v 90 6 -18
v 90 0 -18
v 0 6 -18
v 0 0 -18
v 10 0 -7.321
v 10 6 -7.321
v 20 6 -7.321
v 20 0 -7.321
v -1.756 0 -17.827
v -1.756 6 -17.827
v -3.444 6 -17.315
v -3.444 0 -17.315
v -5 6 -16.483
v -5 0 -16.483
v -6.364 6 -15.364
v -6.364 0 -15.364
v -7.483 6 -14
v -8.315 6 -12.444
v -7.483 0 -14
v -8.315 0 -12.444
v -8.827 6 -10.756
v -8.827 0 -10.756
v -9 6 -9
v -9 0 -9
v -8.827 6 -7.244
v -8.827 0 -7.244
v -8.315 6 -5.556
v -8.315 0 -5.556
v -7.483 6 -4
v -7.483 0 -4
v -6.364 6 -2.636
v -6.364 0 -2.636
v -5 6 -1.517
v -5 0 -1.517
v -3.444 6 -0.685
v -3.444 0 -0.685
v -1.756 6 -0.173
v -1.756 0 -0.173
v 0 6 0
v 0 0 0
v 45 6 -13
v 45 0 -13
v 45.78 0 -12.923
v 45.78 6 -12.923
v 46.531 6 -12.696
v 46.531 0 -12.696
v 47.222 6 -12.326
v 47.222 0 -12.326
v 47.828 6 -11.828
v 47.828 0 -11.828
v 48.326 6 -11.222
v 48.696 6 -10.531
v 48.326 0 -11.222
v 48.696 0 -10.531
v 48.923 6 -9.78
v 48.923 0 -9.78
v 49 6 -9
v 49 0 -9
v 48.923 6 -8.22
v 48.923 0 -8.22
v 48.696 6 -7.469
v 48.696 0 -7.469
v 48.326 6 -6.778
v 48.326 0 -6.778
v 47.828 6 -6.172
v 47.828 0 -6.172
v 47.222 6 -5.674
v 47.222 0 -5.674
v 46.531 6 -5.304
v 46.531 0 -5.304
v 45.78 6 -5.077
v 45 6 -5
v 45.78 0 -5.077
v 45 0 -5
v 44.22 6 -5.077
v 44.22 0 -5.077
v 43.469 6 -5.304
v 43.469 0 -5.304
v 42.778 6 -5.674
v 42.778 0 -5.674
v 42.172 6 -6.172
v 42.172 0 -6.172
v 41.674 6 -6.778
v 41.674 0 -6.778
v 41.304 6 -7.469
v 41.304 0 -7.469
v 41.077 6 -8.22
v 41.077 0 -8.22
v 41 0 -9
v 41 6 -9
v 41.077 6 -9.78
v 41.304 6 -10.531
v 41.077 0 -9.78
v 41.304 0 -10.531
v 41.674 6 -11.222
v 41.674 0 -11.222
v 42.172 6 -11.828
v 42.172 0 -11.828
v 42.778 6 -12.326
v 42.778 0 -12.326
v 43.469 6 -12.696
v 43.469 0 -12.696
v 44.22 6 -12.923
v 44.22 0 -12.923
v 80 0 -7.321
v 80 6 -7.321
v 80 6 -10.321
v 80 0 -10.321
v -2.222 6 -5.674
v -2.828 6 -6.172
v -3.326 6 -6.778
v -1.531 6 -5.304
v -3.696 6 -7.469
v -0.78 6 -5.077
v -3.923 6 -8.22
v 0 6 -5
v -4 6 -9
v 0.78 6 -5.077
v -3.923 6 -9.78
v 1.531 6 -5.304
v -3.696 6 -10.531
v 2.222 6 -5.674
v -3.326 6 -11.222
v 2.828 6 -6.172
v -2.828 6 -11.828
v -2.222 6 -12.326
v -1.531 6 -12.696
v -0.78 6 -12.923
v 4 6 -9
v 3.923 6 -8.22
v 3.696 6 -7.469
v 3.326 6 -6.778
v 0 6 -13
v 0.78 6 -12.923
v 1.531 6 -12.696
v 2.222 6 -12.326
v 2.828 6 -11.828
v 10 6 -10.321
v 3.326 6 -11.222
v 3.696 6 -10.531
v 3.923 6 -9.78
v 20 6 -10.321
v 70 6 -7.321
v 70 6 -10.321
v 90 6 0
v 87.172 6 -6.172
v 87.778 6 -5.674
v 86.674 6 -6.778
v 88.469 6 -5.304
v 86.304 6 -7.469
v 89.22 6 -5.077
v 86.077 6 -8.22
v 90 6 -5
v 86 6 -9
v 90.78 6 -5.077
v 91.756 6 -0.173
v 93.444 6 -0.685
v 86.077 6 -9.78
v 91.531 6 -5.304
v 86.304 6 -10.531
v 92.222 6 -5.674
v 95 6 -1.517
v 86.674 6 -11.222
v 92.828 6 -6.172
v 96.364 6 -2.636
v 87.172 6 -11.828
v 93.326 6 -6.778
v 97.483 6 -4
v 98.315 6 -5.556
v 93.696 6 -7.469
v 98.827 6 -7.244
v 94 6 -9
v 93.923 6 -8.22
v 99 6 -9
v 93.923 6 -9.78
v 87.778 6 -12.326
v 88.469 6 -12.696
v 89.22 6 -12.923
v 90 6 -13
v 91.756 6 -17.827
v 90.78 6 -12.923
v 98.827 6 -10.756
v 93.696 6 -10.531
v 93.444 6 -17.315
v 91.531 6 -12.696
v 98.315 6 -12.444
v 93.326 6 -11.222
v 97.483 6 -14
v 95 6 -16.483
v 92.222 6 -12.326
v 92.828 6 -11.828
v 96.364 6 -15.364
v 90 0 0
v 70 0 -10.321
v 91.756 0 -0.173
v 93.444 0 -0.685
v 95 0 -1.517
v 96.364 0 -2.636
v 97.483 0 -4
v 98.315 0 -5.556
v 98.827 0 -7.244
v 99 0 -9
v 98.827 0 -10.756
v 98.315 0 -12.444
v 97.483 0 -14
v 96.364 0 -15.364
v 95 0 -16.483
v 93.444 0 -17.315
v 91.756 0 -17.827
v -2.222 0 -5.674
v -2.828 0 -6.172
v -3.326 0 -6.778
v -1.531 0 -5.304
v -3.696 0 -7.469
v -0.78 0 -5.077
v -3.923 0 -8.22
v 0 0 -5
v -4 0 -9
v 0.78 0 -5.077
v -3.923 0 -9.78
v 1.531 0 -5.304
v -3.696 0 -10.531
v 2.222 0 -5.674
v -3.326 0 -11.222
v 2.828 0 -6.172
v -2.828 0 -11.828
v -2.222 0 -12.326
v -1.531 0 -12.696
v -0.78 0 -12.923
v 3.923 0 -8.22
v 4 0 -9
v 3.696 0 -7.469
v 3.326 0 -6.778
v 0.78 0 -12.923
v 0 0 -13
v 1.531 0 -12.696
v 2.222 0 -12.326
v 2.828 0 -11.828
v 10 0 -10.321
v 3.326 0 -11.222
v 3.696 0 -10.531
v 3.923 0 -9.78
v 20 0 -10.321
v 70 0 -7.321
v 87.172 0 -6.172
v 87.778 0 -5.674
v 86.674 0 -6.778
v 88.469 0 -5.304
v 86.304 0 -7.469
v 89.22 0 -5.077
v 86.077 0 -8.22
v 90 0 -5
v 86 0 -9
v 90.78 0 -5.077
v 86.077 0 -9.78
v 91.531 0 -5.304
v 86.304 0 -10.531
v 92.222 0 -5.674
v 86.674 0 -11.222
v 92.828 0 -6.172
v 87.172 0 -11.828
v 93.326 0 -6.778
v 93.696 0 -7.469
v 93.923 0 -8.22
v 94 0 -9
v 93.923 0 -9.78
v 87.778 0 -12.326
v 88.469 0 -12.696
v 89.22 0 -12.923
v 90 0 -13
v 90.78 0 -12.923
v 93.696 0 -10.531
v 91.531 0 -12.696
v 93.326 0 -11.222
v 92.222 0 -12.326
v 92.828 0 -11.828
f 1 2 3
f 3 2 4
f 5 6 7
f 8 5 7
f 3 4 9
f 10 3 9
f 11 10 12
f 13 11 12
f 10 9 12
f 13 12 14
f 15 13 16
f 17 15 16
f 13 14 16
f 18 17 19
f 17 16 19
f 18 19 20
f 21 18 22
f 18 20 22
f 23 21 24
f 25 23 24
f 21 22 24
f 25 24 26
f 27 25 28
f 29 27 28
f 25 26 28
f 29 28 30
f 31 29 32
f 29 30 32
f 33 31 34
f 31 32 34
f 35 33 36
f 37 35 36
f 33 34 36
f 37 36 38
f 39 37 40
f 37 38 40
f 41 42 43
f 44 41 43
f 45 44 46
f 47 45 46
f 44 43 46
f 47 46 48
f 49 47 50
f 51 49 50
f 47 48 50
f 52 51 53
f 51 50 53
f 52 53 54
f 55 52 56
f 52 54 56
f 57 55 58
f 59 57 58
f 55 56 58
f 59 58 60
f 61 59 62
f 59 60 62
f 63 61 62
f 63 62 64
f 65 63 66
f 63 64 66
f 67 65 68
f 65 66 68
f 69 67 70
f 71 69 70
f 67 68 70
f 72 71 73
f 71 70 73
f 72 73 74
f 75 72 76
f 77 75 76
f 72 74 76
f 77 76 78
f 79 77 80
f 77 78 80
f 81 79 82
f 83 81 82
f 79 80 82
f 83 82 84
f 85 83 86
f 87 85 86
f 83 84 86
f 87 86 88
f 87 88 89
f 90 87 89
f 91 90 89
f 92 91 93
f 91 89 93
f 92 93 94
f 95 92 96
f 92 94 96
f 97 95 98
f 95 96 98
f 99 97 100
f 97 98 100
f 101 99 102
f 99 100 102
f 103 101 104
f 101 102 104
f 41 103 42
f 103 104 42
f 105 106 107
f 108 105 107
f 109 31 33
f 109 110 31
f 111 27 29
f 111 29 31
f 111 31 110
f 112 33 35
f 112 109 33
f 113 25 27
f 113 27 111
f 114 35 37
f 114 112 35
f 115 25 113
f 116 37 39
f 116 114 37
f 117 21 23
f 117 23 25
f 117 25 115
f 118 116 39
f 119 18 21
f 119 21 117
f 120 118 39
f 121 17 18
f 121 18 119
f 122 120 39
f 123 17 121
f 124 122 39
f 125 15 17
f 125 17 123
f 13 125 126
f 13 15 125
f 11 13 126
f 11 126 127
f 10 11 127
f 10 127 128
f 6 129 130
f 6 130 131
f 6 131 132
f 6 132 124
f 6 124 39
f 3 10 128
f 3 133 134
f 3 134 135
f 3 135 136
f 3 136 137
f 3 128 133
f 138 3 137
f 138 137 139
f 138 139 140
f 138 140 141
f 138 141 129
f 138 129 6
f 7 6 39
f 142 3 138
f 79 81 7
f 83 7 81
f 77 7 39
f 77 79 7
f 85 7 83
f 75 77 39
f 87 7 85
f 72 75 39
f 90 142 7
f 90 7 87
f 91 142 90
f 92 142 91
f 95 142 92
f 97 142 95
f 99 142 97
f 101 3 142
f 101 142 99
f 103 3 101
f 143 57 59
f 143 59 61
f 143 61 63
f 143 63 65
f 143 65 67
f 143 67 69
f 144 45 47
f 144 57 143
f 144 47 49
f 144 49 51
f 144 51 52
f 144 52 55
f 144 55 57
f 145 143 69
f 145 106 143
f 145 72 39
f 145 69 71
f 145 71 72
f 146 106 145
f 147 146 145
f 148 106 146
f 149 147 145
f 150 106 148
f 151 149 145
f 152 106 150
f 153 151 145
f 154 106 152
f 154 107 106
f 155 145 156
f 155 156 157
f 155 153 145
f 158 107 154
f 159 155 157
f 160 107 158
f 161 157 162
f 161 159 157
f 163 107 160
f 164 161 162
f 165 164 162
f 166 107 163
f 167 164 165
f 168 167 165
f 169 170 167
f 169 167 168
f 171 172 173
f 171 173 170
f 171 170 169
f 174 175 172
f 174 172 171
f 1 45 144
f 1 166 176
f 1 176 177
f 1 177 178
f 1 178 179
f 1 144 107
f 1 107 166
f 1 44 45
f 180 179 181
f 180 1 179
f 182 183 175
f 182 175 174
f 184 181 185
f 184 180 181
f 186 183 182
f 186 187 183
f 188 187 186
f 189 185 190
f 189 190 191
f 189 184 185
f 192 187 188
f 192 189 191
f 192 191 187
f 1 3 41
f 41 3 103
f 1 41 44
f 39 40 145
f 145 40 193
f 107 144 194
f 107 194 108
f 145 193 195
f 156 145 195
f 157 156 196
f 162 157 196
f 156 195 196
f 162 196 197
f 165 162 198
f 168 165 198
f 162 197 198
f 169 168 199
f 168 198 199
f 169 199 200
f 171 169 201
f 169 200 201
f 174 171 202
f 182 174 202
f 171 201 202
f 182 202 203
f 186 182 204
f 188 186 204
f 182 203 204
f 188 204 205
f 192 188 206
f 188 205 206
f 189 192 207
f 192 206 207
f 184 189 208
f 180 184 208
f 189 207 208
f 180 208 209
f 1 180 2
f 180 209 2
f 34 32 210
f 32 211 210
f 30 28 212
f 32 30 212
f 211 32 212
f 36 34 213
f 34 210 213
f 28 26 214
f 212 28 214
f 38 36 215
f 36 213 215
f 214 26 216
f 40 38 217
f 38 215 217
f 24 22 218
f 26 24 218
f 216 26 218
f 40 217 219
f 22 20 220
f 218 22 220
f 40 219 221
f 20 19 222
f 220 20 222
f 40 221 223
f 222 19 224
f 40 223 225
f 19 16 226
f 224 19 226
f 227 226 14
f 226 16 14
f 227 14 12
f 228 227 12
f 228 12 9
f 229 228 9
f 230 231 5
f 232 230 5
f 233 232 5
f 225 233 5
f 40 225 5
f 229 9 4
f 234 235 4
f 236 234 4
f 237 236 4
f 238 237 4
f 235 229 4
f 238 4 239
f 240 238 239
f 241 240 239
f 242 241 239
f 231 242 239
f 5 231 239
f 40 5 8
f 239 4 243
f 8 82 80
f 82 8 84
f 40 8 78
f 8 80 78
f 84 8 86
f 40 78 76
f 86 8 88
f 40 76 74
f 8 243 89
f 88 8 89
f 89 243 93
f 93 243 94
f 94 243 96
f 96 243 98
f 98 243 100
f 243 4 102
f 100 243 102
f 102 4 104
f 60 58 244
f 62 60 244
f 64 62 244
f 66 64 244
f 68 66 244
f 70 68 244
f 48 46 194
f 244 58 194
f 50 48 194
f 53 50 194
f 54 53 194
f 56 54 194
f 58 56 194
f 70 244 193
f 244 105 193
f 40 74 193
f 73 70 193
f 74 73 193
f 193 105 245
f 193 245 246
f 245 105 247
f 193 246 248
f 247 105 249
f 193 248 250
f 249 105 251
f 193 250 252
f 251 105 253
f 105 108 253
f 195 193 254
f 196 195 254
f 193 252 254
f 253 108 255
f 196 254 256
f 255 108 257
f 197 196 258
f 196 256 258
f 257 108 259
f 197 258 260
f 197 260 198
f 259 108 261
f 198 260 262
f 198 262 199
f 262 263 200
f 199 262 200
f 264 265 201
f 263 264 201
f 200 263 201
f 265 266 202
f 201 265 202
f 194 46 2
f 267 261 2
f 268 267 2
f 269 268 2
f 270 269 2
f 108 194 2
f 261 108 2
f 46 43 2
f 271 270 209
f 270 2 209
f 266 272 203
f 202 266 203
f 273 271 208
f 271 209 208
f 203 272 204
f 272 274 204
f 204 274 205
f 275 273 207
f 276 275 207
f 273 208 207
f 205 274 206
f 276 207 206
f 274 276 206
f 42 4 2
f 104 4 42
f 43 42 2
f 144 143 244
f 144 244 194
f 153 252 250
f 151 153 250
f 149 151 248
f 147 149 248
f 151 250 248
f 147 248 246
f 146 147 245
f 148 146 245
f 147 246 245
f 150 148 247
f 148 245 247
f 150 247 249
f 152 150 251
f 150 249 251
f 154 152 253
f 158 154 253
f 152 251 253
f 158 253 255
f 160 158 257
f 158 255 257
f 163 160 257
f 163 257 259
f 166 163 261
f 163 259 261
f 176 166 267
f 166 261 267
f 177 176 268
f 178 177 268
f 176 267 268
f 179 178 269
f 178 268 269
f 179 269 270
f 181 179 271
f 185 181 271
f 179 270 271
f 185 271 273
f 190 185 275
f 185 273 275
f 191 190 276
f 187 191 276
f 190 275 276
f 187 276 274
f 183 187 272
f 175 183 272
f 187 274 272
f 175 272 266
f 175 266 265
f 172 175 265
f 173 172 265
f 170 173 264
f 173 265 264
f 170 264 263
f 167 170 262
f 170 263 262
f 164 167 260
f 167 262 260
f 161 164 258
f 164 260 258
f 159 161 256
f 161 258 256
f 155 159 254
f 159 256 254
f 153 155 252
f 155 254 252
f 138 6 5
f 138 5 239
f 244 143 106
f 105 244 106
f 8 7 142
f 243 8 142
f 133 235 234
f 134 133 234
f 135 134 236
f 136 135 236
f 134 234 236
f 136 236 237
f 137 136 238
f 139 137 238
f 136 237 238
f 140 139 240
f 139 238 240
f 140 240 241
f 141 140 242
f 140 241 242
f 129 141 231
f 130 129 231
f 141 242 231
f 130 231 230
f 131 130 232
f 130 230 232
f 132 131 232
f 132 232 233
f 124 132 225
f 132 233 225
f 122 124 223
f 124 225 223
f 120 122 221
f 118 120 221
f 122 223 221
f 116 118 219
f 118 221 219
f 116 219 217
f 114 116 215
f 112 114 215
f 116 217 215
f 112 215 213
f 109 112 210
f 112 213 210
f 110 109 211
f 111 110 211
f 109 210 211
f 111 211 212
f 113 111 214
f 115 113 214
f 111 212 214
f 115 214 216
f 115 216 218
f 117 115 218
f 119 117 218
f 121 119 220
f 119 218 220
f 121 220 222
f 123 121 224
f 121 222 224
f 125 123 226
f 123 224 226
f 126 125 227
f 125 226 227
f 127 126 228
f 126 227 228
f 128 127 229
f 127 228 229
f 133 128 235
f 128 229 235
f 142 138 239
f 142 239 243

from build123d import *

# Parameters (mm, degrees)
BOSS_EXTRUDE1_DEPTH = 6
SKETCH3_R           = 4
CUT_EXTRUDE1_DEPTH  = 6
SKETCH4_W           = 10
SKETCH4_H           = 3
CUT_EXTRUDE2_DEPTH  = 6


with BuildPart() as part:
    # Sketch2 → Boss-Extrude1 (new body)
    with BuildSketch(Plane(origin=(0, 0, 0), x_dir=(1, 0, 0), z_dir=(0, 1, 0))):
        with BuildLine():
            Line((0, 0), (90, 0))
            ThreePointArc((90, 0), (99, 9), (90, 18))
            Line((90, 18), (0, 18))
            ThreePointArc((0, 18), (-9, 9), (0, 0))
        make_face()
    extrude(amount=BOSS_EXTRUDE1_DEPTH)

    # Sketch3 → Cut-Extrude1 (cut)
    with BuildSketch(Plane.XZ):
        with Locations(Location((0, -9, 0), (0, 0, 270))):
            Circle(SKETCH3_R)
        with Locations(Location((90, -9, 0), (0, 0, 90))):
            Circle(SKETCH3_R)
        with Locations(Location((45, -9, 0), (0, 0, 270))):
            Circle(SKETCH3_R)
    extrude(amount=-CUT_EXTRUDE1_DEPTH, mode=Mode.SUBTRACT)

    # Sketch4 → Cut-Extrude2 (cut)
    with BuildSketch(Plane(origin=(0, 6, 0), x_dir=(1, 0, 0), z_dir=(0, 1, 0))):
        with Locations((15, 8.821259453)):
            Rectangle(SKETCH4_W, SKETCH4_H)
        with Locations((75, 8.821259453)):
            Rectangle(SKETCH4_W, SKETCH4_H)
    extrude(amount=-CUT_EXTRUDE2_DEPTH, mode=Mode.SUBTRACT)


solid = part.part
